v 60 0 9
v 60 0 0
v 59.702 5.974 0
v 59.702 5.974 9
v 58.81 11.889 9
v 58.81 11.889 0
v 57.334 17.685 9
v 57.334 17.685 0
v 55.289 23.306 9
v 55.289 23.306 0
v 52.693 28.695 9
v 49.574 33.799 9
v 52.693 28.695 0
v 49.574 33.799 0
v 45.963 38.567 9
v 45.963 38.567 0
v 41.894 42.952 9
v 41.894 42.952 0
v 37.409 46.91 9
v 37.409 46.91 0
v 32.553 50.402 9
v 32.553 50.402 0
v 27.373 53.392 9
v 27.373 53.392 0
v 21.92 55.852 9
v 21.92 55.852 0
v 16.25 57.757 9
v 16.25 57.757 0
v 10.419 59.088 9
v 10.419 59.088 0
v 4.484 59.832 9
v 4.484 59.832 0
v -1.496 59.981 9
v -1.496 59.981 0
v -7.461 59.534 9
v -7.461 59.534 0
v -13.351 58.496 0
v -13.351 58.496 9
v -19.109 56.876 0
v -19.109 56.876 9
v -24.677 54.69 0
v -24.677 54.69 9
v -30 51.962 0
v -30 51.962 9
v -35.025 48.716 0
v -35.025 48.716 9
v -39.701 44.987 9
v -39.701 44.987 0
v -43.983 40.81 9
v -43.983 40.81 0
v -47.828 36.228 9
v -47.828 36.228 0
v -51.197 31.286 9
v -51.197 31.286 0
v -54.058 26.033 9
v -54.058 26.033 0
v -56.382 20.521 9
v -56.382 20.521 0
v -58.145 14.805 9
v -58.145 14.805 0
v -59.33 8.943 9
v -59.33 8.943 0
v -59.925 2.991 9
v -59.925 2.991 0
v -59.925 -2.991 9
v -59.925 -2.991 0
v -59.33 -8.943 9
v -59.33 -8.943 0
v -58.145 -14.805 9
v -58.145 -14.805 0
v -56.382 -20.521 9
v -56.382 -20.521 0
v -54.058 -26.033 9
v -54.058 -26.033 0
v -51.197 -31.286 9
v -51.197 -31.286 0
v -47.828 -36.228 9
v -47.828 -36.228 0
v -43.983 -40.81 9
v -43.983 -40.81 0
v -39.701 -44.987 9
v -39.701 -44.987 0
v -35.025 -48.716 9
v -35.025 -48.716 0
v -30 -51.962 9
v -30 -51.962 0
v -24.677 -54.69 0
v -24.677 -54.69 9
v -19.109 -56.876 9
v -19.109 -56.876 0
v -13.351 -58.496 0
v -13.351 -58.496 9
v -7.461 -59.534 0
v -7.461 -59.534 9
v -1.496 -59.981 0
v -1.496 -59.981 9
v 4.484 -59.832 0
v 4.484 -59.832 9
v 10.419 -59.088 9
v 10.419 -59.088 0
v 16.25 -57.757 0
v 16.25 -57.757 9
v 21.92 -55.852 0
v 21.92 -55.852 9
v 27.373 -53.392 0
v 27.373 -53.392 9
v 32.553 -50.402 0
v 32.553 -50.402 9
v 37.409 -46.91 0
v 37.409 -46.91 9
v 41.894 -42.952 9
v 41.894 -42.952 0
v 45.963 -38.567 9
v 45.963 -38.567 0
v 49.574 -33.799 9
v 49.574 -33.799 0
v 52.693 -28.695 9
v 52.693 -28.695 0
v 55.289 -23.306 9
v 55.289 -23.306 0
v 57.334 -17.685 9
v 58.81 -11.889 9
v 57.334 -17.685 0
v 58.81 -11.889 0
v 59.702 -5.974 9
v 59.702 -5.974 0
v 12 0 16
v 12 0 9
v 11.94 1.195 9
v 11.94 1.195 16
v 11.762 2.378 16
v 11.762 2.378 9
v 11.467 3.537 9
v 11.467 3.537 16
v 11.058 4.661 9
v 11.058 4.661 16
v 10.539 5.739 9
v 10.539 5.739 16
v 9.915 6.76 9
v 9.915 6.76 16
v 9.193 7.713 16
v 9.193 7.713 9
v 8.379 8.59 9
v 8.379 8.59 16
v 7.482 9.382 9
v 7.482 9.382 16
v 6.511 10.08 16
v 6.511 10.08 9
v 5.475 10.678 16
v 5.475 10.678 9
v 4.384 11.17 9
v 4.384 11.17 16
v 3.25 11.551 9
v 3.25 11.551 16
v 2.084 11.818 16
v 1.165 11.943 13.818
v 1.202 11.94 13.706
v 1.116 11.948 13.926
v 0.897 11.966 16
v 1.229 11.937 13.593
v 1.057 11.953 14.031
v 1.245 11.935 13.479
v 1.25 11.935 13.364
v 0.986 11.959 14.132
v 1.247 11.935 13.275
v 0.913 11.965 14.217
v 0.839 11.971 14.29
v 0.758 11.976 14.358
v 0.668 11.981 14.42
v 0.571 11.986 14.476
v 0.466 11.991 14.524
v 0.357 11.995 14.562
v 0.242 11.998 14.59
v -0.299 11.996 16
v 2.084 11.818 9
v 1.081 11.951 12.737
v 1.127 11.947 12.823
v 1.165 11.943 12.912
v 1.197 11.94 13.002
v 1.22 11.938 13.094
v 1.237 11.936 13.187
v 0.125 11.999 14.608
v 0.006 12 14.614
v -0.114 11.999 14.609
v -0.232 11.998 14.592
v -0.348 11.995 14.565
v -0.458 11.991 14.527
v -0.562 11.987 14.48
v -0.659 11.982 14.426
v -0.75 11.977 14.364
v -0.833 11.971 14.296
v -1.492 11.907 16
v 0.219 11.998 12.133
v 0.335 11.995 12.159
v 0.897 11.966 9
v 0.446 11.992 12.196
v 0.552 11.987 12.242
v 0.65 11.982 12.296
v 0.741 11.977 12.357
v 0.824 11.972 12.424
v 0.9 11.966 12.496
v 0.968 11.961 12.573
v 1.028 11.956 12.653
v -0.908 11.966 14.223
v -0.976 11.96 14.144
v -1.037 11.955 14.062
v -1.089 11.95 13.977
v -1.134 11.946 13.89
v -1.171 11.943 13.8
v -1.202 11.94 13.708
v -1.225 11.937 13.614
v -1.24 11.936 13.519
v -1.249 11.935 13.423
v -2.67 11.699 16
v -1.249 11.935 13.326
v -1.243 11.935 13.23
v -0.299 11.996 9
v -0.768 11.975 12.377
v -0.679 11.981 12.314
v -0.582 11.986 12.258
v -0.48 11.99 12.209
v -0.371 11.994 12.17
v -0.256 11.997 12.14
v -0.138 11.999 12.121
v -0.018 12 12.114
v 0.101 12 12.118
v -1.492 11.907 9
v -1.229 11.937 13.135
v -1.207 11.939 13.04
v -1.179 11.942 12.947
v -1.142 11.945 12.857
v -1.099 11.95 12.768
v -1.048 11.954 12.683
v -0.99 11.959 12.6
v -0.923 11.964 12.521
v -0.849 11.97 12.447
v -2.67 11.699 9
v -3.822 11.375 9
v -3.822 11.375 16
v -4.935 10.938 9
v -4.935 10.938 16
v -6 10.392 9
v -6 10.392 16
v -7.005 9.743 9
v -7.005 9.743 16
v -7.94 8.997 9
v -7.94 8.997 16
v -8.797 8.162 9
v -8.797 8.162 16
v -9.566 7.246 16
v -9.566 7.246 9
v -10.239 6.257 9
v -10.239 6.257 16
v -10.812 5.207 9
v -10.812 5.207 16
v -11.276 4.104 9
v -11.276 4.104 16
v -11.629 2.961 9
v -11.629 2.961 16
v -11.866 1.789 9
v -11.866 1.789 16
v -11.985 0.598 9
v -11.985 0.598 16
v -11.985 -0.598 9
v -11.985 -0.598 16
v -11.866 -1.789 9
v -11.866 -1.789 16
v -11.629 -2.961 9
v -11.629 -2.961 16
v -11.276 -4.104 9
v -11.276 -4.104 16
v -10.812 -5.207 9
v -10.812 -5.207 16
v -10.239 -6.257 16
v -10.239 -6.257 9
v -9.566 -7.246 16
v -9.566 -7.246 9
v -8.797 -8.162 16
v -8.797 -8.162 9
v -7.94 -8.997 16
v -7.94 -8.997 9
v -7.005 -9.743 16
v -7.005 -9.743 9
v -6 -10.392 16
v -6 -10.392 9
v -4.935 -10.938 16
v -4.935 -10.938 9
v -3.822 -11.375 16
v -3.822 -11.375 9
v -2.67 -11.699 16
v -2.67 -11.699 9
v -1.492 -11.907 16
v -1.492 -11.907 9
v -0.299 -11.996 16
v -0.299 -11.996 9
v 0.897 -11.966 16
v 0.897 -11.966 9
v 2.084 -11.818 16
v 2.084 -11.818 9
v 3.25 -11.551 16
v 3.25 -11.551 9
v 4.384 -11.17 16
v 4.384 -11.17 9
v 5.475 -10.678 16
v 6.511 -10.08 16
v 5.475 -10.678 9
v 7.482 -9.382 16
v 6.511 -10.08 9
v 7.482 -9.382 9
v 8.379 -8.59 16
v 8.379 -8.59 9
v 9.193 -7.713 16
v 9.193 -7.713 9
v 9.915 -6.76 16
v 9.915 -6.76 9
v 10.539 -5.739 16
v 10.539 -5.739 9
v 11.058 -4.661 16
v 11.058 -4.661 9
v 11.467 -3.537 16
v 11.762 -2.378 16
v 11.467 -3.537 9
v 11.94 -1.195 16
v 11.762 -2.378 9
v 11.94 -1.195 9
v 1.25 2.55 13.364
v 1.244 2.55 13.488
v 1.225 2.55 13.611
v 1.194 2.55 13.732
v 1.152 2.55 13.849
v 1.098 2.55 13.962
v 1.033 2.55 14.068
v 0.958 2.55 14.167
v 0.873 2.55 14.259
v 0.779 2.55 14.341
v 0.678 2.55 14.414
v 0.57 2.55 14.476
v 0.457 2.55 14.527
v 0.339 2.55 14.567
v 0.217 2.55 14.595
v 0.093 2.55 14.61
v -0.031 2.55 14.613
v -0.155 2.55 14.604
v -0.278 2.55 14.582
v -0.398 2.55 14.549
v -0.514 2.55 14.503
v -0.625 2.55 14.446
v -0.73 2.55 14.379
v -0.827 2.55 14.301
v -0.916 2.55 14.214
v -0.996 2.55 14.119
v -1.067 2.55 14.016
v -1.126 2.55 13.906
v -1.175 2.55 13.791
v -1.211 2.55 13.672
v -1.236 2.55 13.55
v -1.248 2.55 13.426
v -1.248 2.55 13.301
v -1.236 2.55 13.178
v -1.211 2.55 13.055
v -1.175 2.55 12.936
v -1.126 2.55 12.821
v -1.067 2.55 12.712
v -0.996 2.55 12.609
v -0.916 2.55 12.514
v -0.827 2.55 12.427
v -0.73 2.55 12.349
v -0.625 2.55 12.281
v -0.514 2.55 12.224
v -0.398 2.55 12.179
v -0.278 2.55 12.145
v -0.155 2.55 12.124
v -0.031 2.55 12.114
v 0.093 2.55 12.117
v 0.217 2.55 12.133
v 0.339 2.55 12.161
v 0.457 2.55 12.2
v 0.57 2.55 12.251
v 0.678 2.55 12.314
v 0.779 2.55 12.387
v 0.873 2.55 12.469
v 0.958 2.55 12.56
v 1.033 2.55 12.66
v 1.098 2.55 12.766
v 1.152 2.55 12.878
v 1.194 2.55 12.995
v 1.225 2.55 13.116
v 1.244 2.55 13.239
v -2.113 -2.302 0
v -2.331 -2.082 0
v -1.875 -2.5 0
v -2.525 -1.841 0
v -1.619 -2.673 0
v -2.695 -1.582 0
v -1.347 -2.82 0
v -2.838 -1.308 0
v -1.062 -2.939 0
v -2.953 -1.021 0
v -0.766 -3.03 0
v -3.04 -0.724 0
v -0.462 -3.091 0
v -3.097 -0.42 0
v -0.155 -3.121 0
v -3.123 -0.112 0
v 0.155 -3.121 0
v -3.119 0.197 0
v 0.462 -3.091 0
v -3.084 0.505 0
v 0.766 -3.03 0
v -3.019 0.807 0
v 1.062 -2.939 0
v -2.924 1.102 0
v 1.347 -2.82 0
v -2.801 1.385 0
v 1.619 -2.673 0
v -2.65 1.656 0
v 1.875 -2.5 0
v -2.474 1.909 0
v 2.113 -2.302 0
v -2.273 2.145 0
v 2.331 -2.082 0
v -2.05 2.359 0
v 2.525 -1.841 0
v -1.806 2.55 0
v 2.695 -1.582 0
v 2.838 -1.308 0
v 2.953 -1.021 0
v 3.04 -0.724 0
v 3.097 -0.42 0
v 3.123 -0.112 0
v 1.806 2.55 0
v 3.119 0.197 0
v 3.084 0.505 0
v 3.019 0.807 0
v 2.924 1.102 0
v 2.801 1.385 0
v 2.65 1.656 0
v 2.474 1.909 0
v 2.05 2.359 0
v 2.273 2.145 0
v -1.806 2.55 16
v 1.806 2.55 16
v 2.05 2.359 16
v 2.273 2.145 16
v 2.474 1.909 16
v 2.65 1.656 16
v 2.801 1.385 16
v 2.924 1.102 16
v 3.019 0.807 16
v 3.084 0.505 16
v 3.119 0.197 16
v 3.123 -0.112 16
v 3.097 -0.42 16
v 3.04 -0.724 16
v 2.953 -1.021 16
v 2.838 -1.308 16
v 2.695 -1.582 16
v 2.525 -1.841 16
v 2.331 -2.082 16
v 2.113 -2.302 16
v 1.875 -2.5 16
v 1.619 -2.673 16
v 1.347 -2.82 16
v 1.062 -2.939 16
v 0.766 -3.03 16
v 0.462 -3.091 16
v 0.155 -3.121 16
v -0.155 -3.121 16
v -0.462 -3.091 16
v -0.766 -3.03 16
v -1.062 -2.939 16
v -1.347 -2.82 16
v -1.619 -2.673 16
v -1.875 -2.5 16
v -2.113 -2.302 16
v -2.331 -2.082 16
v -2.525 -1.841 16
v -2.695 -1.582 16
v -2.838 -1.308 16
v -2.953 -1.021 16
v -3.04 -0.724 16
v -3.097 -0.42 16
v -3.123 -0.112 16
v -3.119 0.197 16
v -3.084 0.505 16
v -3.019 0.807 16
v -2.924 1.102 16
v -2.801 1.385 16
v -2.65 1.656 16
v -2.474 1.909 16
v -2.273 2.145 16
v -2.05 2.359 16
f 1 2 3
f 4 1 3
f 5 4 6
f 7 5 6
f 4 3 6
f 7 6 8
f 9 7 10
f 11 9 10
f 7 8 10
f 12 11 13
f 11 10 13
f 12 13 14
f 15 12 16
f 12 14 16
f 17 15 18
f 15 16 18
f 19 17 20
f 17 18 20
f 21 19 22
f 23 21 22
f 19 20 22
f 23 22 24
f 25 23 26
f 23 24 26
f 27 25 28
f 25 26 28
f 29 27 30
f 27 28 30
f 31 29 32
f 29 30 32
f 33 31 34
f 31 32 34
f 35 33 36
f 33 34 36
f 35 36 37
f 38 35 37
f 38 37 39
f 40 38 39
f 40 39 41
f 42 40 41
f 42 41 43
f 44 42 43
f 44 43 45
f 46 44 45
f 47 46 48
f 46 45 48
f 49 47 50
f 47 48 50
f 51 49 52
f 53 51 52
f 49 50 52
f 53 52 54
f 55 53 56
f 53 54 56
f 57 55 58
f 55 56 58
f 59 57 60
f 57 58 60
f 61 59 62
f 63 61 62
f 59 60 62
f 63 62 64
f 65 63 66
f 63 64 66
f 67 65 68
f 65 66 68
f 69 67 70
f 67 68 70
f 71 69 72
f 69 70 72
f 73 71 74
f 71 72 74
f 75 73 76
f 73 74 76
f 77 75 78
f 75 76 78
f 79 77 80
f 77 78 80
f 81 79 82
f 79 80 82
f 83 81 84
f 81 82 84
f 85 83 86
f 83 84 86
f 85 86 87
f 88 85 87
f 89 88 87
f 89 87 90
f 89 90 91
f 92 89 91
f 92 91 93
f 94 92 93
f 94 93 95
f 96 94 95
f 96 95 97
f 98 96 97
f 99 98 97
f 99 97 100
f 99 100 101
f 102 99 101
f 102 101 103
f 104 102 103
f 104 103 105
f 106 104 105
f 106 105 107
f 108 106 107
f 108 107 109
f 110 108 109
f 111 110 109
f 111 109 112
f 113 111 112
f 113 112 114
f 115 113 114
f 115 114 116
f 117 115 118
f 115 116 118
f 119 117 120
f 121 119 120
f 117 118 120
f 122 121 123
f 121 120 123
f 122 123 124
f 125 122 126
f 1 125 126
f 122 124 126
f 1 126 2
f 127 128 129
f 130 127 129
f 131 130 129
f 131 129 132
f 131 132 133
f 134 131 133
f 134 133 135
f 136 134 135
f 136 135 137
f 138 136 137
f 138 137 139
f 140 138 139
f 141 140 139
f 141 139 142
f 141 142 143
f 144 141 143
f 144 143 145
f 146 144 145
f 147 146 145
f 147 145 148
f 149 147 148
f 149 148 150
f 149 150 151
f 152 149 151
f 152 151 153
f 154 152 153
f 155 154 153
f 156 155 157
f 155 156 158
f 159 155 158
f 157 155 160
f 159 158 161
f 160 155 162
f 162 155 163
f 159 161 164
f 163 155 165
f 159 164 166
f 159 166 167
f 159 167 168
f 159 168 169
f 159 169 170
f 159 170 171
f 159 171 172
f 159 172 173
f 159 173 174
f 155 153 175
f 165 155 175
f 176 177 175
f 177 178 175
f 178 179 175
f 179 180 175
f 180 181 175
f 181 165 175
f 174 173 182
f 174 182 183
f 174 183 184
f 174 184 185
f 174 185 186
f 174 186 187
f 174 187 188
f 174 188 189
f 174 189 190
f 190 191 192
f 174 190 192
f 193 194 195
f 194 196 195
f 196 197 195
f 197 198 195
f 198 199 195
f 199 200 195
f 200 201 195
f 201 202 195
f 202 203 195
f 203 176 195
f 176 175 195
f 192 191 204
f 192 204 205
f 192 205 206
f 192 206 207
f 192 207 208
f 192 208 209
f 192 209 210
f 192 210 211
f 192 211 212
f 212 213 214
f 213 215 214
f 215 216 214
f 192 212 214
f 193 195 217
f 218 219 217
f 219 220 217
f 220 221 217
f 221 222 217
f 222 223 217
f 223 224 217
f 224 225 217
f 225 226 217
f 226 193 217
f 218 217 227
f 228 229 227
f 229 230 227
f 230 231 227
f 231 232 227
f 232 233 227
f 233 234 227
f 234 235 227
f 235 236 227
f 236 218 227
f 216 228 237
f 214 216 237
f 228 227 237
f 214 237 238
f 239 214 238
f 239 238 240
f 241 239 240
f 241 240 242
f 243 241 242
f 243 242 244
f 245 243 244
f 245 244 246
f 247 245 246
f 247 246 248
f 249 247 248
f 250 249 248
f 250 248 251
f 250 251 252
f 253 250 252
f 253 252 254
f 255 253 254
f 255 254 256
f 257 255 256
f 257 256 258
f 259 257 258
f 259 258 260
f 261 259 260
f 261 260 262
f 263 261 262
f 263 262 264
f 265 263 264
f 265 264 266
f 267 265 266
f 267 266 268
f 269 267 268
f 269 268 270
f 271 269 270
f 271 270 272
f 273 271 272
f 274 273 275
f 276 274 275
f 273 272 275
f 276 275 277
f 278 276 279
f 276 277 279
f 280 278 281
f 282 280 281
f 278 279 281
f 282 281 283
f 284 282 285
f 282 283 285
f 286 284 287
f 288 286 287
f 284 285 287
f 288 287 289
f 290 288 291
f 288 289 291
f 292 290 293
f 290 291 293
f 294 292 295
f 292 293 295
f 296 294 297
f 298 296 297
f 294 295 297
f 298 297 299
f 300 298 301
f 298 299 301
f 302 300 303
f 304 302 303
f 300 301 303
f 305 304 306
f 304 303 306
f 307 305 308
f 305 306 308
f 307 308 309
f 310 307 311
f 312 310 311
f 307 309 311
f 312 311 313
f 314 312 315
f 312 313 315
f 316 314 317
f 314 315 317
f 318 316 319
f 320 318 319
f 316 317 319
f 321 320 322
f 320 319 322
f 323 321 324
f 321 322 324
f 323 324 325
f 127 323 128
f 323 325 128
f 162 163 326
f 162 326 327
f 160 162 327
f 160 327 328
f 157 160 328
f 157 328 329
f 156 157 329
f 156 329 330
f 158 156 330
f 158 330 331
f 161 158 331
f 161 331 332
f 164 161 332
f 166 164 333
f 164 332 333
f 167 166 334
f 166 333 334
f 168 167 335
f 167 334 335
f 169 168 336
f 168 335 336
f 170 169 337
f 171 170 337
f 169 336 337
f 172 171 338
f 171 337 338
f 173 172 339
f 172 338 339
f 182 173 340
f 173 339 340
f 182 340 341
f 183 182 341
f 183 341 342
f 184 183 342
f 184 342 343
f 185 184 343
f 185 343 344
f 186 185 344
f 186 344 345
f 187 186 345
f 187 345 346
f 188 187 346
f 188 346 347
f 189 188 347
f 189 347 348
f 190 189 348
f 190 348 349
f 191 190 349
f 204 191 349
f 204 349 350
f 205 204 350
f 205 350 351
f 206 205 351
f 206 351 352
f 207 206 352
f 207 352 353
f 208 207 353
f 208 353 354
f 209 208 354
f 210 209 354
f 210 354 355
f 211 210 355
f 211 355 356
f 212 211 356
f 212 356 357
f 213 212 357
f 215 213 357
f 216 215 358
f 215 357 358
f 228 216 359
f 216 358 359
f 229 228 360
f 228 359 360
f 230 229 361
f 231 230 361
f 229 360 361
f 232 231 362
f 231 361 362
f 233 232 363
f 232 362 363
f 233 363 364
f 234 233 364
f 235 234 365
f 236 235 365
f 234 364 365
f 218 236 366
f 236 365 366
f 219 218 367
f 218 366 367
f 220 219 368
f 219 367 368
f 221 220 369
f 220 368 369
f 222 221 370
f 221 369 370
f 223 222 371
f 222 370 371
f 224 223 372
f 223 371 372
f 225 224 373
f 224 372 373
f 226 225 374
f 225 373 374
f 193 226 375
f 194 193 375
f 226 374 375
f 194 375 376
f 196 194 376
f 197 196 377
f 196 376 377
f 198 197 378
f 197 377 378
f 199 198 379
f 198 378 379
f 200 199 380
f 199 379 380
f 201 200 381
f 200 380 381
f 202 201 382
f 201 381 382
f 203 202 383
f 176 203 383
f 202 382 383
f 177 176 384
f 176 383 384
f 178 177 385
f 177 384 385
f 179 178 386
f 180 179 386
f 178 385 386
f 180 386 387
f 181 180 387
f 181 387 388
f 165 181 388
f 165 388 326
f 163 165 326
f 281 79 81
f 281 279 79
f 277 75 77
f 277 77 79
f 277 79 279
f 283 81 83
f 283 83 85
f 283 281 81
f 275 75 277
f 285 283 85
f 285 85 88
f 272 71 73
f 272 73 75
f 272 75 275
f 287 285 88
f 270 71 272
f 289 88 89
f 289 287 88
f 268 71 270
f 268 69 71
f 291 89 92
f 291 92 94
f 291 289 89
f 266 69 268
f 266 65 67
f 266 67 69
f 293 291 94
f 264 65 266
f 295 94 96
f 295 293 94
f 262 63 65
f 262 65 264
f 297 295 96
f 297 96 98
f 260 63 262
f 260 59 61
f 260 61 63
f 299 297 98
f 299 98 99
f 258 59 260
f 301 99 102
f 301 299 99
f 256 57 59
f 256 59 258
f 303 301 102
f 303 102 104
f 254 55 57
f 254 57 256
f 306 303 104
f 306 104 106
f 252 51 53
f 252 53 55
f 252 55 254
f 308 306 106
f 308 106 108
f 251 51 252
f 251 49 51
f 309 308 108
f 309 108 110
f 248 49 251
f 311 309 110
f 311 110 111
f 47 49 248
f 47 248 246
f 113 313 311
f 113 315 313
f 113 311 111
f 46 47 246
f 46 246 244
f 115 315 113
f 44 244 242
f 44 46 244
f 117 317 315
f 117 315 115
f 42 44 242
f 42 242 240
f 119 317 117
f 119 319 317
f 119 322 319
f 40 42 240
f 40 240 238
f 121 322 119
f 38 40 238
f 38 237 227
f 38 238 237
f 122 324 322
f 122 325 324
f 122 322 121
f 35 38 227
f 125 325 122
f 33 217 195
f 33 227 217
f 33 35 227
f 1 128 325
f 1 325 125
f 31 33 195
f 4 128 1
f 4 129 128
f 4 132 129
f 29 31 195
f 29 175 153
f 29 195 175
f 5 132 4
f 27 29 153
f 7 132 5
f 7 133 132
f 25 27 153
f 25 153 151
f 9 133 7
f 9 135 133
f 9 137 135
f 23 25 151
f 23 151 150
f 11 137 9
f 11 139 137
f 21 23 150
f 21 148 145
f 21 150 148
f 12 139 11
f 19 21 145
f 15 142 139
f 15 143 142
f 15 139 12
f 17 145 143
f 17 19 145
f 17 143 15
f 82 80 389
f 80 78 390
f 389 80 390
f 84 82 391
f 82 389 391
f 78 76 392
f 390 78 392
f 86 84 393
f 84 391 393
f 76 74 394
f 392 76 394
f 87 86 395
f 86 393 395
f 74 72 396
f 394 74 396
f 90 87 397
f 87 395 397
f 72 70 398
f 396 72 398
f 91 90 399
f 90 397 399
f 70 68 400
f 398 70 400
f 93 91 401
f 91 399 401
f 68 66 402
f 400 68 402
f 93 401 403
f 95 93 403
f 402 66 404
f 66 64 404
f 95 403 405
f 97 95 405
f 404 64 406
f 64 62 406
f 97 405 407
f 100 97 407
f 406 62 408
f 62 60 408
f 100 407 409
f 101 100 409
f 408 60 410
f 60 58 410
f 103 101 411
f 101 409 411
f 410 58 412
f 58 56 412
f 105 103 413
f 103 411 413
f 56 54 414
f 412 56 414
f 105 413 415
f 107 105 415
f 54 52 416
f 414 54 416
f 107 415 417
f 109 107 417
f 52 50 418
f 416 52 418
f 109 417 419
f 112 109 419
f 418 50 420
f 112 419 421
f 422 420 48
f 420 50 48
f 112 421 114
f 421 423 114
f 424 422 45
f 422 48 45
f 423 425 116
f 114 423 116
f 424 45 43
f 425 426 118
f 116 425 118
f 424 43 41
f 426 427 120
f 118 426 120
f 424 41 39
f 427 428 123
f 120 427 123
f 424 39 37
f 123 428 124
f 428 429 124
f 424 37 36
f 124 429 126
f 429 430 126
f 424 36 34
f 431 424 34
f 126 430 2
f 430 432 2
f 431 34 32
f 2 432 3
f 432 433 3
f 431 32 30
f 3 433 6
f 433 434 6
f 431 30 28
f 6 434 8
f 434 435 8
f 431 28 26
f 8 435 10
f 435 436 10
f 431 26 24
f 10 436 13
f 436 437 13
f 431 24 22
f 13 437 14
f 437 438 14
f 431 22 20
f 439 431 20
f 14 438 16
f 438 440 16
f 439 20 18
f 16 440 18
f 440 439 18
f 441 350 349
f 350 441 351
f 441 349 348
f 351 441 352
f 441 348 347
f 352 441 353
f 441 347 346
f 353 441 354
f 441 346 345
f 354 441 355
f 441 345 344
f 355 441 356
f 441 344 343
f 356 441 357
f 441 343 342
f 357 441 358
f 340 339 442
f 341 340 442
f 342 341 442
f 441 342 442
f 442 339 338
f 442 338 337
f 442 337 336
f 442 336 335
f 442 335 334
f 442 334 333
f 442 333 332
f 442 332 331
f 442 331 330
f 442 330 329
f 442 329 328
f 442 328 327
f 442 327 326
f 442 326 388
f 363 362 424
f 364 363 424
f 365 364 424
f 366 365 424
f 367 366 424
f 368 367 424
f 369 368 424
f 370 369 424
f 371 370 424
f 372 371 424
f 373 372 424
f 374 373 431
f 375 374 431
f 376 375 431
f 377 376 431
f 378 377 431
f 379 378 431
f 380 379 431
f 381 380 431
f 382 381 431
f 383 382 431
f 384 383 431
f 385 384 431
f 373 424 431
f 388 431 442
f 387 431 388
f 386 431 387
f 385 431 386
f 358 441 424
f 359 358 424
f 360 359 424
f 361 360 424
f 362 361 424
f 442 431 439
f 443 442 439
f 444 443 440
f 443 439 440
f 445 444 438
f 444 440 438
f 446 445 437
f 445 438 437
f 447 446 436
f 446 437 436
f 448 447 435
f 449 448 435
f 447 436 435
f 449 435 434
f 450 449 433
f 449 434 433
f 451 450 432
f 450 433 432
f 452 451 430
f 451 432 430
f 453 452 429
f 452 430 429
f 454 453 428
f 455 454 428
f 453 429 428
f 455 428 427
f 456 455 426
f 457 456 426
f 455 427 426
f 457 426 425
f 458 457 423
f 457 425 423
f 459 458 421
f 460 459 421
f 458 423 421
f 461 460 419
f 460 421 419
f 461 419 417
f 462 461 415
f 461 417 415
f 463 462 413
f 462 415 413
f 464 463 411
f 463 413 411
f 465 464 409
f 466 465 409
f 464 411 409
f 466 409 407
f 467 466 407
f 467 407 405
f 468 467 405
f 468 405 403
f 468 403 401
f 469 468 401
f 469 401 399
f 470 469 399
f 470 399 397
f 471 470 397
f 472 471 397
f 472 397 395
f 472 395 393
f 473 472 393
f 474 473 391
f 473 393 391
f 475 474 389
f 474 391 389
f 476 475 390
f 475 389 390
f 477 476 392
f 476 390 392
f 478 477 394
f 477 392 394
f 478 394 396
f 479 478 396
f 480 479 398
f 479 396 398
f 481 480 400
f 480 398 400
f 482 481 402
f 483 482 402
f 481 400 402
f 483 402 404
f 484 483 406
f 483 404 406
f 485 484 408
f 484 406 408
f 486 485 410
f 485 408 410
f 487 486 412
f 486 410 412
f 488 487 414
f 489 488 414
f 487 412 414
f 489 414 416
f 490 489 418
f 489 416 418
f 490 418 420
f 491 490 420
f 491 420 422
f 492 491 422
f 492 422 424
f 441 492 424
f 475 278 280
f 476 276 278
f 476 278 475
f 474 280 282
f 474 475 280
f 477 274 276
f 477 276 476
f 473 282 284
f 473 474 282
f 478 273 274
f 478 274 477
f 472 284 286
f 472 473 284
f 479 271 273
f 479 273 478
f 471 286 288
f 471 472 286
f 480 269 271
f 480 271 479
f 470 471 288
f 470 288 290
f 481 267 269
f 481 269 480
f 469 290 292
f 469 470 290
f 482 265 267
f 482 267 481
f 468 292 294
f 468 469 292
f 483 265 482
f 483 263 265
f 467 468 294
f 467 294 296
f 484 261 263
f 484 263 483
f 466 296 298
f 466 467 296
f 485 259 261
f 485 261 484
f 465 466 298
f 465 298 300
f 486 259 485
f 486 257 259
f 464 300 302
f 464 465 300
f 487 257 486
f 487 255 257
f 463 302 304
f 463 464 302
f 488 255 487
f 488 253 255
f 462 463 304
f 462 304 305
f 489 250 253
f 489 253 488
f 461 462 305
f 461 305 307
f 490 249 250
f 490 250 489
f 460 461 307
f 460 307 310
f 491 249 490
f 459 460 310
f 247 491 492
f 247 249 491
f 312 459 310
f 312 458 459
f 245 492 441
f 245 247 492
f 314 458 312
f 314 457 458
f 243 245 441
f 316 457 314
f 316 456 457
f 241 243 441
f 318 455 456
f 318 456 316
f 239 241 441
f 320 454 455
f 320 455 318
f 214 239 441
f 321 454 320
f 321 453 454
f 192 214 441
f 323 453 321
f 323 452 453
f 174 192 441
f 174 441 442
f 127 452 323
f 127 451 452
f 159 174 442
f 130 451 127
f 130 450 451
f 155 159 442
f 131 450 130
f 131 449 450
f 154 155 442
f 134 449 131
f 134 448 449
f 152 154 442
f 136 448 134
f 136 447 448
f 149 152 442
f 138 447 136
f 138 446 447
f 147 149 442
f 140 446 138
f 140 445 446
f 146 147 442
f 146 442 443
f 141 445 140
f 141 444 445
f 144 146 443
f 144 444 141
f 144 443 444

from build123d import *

# Parameters (mm, degrees)
ESBO_O1_R                = 60
RESSALTO_EXTRUS_O1_DEPTH = 9
ESBO_O3_R                = 12
RESSALTO_EXTRUS_O2_DEPTH = 7
ESBO_O4_R                = 1.25
CORTE_EXTRUS_O1_DEPTH    = 10


with BuildPart() as part:
    # Esboço1 → Ressalto-extrusão1 (new body)
    with BuildSketch(Plane.XY):
        Circle(ESBO_O1_R)
        with BuildLine():
            Line((-1.80641219, 2.55), (1.80641219, 2.55))
            ThreePointArc((1.80641219, 2.55), (0, -3.125), (-1.80641219, 2.55))
        make_face(mode=Mode.SUBTRACT)
    extrude(amount=RESSALTO_EXTRUS_O1_DEPTH)

    # Esboço3 → Ressalto-extrusão2 (add)
    with BuildSketch(Plane.XY.offset(9)):
        Circle(ESBO_O3_R)
        with BuildLine():
            Line((-1.80641219, 2.55), (1.80641219, 2.55))
            ThreePointArc((1.80641219, 2.55), (0, -3.125), (-1.80641219, 2.55))
        make_face(mode=Mode.SUBTRACT)
    extrude(amount=RESSALTO_EXTRUS_O2_DEPTH)

    # Esboço4 → Corte-extrusão1 (cut)
    with BuildSketch(Plane.XZ.offset(-2.55)):
        with Locations((0, 13.363805145)):
            Circle(ESBO_O4_R)
    extrude(amount=-CORTE_EXTRUS_O1_DEPTH, mode=Mode.SUBTRACT)


solid = part.part
